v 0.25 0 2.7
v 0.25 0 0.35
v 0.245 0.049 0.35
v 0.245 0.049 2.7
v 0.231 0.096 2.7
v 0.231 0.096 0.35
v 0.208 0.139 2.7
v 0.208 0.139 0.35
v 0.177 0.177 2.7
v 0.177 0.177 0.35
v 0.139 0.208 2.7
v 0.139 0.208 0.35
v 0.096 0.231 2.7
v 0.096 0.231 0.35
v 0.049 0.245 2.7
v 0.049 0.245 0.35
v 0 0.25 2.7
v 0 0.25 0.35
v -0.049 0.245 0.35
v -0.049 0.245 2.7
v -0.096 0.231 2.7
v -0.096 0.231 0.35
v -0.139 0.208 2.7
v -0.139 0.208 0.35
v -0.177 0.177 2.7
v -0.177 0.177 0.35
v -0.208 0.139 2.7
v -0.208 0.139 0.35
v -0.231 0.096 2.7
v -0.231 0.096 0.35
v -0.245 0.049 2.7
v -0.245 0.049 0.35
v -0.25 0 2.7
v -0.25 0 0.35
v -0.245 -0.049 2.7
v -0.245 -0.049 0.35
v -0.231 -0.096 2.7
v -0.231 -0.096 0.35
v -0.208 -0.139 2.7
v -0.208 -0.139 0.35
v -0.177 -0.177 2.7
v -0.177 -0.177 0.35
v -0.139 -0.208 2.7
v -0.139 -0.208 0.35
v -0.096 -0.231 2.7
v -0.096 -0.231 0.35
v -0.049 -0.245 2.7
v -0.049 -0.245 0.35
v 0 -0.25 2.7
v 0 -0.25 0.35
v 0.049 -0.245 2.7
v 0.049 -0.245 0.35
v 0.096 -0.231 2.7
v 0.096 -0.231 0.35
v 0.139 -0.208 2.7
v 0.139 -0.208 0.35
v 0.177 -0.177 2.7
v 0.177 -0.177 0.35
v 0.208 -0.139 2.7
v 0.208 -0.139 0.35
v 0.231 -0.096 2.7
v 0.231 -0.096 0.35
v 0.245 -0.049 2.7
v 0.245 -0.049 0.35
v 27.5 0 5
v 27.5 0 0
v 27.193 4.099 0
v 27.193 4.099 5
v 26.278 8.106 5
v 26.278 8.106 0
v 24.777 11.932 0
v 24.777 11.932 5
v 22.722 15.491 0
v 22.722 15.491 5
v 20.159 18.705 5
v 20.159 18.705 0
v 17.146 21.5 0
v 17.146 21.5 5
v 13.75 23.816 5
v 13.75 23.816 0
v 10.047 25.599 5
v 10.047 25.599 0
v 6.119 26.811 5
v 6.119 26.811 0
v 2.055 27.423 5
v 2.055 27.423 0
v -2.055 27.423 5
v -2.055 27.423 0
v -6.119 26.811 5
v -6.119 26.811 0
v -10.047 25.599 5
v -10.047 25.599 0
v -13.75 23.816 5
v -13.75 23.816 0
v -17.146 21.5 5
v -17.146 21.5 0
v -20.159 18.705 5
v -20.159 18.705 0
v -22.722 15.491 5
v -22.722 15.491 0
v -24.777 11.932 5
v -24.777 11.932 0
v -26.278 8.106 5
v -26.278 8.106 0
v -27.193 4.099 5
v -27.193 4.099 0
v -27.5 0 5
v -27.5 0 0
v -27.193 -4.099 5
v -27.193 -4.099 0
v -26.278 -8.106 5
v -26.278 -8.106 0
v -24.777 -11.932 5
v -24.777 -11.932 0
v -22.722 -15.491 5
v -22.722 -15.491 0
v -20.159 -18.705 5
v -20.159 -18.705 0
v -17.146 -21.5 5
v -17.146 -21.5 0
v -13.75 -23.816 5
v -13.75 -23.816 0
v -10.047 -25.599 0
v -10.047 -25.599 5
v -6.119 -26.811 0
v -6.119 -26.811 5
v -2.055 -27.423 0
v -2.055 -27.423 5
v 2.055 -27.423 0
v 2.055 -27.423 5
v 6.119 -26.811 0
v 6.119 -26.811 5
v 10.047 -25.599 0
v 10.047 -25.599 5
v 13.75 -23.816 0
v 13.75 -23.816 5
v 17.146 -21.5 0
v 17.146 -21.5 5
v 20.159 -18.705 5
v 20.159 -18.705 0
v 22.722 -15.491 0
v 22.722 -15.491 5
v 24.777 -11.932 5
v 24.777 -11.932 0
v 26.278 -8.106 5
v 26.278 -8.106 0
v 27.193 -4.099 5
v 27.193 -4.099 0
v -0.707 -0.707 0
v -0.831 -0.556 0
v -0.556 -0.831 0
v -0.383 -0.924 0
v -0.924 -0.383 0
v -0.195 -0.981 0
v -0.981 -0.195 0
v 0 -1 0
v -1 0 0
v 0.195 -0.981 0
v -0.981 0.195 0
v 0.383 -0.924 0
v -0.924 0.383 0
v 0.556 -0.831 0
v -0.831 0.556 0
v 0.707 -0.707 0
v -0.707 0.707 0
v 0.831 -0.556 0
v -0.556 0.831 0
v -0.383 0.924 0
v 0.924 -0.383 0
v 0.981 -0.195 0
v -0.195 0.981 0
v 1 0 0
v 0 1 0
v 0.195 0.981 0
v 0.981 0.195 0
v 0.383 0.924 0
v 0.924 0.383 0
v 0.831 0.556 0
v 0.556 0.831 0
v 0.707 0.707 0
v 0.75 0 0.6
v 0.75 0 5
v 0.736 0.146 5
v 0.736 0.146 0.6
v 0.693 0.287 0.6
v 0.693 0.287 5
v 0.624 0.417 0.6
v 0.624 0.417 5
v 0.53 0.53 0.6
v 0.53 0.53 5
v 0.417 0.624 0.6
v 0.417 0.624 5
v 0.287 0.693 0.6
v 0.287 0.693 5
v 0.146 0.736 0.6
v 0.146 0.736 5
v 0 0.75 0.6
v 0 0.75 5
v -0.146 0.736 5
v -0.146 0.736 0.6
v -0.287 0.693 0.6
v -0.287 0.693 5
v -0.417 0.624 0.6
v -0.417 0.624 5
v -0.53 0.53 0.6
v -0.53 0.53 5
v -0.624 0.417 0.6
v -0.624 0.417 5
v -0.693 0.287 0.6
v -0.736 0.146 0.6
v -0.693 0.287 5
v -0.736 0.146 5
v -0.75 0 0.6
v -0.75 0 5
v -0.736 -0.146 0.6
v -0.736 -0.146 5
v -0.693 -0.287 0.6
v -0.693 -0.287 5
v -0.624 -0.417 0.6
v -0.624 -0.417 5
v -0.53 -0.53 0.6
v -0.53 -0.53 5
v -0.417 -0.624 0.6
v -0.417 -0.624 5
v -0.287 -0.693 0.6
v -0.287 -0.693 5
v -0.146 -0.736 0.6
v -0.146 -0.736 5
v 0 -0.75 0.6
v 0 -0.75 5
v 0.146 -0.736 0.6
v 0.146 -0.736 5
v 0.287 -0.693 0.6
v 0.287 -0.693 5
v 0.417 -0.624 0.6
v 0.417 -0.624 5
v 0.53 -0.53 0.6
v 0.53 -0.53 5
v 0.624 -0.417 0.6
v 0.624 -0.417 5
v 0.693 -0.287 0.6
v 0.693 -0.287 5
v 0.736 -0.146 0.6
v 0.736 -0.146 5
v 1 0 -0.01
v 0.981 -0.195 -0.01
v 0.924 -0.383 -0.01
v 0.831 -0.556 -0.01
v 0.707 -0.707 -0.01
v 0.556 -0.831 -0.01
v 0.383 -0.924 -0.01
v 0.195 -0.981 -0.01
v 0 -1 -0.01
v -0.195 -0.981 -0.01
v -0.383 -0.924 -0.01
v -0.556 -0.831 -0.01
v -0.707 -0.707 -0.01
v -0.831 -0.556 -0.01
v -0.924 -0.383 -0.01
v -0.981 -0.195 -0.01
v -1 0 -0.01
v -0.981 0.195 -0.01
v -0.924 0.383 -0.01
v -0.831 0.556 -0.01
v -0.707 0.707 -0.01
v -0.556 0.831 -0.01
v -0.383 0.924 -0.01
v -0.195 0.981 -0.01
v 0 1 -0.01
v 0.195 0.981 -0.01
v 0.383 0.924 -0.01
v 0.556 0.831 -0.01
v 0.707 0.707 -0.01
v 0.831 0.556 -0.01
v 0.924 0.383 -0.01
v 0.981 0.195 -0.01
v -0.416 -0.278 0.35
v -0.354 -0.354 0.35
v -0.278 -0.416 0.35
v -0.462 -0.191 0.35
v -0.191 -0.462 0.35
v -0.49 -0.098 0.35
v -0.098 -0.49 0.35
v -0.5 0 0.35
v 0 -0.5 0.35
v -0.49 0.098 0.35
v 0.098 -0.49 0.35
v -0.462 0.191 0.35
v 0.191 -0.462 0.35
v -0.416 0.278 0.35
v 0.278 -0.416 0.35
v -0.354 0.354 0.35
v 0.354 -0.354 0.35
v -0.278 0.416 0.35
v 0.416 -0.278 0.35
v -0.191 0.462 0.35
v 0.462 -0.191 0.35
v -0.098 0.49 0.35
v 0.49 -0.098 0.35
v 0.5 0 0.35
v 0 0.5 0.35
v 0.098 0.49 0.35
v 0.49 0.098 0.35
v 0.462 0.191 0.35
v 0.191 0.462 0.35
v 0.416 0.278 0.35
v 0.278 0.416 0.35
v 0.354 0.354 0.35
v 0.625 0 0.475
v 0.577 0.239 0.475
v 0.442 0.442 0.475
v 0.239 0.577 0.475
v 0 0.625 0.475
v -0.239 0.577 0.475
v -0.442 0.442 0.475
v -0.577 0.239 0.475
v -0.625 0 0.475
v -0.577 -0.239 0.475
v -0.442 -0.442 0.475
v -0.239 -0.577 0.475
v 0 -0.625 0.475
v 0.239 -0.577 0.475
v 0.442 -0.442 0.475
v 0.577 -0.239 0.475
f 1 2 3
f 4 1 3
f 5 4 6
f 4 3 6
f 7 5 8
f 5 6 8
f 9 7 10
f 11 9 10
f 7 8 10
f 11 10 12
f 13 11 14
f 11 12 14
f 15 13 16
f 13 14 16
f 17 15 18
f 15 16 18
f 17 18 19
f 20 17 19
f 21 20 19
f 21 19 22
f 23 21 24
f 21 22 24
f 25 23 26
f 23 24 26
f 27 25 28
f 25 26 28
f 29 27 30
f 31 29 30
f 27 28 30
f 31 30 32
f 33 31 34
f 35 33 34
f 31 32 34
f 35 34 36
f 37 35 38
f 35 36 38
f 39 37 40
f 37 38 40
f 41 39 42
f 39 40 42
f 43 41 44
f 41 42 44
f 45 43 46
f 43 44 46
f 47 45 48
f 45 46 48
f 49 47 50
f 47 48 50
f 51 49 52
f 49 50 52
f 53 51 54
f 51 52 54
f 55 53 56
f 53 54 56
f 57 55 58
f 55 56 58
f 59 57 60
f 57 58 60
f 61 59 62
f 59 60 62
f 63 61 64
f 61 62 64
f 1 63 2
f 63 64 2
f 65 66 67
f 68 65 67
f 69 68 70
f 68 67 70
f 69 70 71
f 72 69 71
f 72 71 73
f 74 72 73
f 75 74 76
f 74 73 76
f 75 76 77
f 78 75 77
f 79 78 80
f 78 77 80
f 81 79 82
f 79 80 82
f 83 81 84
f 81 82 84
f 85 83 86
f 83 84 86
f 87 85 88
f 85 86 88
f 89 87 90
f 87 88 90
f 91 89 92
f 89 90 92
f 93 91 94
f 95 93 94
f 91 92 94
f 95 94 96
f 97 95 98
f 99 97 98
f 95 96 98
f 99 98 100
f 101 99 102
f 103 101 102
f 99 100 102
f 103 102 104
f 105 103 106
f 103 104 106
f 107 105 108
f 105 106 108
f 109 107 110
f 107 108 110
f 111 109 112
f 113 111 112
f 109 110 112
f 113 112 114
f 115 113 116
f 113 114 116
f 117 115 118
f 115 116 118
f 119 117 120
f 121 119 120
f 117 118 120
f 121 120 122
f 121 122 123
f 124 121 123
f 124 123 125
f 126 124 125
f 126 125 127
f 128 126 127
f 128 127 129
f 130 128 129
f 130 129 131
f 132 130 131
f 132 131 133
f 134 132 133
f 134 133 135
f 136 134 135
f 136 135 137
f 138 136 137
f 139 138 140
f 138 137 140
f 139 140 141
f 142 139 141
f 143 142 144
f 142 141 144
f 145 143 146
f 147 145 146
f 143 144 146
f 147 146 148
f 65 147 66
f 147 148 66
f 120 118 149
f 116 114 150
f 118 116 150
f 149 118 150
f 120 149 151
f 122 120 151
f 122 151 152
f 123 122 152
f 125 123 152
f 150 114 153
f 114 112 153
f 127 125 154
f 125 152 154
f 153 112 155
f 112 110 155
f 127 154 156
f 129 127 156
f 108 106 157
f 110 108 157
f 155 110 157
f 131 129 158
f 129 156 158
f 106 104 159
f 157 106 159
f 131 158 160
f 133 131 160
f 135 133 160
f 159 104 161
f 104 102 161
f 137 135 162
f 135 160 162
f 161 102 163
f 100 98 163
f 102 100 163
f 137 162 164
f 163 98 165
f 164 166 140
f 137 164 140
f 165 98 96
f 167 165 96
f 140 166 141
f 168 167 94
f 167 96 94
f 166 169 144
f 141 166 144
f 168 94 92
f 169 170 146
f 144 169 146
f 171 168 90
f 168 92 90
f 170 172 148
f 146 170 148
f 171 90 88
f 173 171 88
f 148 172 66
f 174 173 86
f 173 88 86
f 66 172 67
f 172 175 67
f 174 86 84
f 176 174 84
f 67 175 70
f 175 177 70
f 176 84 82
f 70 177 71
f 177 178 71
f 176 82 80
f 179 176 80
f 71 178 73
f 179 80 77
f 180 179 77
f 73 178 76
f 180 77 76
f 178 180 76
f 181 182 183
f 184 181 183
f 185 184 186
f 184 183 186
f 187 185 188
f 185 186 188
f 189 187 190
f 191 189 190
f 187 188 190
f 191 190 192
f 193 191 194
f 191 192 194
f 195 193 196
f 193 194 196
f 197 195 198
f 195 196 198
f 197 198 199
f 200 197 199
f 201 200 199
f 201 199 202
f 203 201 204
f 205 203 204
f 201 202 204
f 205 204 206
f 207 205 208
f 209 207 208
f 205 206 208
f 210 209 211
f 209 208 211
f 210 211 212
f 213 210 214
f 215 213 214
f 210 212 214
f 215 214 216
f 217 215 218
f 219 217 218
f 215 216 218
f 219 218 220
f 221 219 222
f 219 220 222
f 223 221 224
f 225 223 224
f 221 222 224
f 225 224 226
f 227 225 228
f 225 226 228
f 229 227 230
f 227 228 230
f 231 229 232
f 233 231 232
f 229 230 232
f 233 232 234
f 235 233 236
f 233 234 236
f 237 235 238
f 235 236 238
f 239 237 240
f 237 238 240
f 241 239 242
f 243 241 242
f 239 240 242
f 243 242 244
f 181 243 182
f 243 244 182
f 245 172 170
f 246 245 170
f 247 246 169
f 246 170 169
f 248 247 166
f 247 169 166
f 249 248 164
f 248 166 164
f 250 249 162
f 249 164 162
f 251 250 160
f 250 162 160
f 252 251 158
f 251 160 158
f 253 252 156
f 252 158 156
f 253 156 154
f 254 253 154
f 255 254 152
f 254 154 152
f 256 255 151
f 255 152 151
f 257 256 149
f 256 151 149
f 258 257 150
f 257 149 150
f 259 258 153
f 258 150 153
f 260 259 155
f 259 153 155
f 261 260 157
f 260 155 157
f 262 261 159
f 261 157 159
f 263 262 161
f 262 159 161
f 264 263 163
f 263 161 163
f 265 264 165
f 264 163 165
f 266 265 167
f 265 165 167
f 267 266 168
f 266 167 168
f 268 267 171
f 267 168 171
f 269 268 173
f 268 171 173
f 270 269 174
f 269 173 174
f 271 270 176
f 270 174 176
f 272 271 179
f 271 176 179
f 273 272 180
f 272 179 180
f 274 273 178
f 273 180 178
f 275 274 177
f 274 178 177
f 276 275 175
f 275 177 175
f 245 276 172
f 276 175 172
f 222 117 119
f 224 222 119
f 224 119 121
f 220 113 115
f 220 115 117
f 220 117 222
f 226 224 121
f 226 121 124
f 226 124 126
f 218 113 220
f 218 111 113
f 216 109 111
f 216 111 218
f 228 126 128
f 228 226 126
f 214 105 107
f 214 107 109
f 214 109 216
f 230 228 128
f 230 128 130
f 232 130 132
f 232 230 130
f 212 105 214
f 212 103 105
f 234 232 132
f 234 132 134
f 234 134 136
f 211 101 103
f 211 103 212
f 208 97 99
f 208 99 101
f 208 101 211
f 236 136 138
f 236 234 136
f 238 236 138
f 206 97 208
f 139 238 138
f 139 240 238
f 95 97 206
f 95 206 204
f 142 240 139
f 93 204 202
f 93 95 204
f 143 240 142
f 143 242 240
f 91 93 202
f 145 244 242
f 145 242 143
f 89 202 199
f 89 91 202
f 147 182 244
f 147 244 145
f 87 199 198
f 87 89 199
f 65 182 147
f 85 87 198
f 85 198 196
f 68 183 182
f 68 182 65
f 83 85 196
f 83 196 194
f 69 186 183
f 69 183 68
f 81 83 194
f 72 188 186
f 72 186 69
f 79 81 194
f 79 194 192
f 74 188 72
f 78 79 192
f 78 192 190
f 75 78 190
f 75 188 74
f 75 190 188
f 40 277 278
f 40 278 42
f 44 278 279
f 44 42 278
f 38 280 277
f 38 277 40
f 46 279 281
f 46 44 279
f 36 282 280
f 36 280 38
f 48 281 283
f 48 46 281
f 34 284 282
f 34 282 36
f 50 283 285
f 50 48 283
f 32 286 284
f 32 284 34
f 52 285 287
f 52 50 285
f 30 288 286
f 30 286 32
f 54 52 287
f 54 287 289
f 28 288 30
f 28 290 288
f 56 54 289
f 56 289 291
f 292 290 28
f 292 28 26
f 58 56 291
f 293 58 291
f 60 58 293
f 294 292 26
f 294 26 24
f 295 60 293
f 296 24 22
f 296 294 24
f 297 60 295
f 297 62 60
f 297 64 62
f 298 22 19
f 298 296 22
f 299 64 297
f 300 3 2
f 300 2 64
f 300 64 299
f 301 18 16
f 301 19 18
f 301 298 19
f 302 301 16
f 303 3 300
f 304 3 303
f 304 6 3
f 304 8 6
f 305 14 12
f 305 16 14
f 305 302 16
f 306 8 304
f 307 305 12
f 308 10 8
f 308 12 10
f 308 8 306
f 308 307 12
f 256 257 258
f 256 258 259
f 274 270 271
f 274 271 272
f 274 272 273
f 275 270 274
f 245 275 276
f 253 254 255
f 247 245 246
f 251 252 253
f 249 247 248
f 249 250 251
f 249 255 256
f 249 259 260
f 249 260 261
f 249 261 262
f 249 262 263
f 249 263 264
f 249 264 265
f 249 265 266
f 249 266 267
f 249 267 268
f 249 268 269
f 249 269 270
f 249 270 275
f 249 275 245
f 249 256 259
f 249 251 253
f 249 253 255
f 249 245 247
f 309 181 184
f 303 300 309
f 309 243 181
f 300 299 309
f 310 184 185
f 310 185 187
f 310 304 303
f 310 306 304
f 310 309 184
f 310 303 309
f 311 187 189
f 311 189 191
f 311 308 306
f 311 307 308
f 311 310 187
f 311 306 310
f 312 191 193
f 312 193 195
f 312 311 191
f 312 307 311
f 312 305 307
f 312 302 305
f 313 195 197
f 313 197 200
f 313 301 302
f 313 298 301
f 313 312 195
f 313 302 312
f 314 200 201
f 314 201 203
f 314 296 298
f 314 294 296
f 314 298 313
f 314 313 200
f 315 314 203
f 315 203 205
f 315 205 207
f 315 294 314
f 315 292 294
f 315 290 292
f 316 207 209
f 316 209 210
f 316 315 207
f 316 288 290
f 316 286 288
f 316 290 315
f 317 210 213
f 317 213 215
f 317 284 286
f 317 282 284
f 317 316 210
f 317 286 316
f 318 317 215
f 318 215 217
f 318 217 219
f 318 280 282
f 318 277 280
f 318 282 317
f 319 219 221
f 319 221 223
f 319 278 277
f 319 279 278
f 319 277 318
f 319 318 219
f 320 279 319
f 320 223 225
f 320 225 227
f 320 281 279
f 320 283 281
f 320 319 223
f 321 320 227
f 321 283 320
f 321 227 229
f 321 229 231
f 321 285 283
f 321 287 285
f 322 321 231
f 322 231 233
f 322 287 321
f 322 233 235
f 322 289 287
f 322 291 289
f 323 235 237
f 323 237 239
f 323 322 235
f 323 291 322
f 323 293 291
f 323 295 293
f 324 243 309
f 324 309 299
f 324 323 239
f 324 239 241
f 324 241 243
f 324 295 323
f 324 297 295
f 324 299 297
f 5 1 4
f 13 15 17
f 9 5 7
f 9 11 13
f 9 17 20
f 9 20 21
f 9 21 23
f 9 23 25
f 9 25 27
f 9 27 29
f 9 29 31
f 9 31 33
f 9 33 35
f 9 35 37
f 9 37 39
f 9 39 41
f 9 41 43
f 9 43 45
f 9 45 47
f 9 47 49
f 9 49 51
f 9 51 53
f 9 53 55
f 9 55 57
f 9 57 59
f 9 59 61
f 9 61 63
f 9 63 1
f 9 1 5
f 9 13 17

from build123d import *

# Parameters (mm, degrees)
F0_R     = 27.5
F1_DEPTH = 5
F2_R     = 0.75
F3_DEPTH = 4.65
F4_R     = 0.25
F5_DEPTH = 2.35
F6_SIZE  = 0.25
F7_R     = 1
F8_DEPTH = 0.01


with BuildPart() as f1:
    # F0 (on Top) → F1 (new body)
    with BuildSketch(Plane.XY):
        Circle(F0_R)
    extrude(amount=F1_DEPTH)

    # F2 (on face) → F3 (cut)
    with BuildSketch(Plane.XY.offset(5)):
        Circle(F2_R)
    extrude(amount=-F3_DEPTH, mode=Mode.SUBTRACT)

    # F4 (on face) → F5 (join)
    with BuildSketch(Plane.XY.offset(0.35)):
        Circle(F4_R)
    extrude(amount=F5_DEPTH)

    # F6
    f6_edges = [f1.edges().sort_by_distance(p)[0] for p in [
        (-0.75, 0, 0.35),
    ]]
    chamfer(f6_edges, length=F6_SIZE)

    # F7 (on face) → F8 (join)
    with BuildSketch(Plane(origin=(0, 0, 0), x_dir=(1, 0, 0), z_dir=(0, 0, -1))):
        Circle(F7_R)
    extrude(amount=F8_DEPTH)


solid = f1.part
